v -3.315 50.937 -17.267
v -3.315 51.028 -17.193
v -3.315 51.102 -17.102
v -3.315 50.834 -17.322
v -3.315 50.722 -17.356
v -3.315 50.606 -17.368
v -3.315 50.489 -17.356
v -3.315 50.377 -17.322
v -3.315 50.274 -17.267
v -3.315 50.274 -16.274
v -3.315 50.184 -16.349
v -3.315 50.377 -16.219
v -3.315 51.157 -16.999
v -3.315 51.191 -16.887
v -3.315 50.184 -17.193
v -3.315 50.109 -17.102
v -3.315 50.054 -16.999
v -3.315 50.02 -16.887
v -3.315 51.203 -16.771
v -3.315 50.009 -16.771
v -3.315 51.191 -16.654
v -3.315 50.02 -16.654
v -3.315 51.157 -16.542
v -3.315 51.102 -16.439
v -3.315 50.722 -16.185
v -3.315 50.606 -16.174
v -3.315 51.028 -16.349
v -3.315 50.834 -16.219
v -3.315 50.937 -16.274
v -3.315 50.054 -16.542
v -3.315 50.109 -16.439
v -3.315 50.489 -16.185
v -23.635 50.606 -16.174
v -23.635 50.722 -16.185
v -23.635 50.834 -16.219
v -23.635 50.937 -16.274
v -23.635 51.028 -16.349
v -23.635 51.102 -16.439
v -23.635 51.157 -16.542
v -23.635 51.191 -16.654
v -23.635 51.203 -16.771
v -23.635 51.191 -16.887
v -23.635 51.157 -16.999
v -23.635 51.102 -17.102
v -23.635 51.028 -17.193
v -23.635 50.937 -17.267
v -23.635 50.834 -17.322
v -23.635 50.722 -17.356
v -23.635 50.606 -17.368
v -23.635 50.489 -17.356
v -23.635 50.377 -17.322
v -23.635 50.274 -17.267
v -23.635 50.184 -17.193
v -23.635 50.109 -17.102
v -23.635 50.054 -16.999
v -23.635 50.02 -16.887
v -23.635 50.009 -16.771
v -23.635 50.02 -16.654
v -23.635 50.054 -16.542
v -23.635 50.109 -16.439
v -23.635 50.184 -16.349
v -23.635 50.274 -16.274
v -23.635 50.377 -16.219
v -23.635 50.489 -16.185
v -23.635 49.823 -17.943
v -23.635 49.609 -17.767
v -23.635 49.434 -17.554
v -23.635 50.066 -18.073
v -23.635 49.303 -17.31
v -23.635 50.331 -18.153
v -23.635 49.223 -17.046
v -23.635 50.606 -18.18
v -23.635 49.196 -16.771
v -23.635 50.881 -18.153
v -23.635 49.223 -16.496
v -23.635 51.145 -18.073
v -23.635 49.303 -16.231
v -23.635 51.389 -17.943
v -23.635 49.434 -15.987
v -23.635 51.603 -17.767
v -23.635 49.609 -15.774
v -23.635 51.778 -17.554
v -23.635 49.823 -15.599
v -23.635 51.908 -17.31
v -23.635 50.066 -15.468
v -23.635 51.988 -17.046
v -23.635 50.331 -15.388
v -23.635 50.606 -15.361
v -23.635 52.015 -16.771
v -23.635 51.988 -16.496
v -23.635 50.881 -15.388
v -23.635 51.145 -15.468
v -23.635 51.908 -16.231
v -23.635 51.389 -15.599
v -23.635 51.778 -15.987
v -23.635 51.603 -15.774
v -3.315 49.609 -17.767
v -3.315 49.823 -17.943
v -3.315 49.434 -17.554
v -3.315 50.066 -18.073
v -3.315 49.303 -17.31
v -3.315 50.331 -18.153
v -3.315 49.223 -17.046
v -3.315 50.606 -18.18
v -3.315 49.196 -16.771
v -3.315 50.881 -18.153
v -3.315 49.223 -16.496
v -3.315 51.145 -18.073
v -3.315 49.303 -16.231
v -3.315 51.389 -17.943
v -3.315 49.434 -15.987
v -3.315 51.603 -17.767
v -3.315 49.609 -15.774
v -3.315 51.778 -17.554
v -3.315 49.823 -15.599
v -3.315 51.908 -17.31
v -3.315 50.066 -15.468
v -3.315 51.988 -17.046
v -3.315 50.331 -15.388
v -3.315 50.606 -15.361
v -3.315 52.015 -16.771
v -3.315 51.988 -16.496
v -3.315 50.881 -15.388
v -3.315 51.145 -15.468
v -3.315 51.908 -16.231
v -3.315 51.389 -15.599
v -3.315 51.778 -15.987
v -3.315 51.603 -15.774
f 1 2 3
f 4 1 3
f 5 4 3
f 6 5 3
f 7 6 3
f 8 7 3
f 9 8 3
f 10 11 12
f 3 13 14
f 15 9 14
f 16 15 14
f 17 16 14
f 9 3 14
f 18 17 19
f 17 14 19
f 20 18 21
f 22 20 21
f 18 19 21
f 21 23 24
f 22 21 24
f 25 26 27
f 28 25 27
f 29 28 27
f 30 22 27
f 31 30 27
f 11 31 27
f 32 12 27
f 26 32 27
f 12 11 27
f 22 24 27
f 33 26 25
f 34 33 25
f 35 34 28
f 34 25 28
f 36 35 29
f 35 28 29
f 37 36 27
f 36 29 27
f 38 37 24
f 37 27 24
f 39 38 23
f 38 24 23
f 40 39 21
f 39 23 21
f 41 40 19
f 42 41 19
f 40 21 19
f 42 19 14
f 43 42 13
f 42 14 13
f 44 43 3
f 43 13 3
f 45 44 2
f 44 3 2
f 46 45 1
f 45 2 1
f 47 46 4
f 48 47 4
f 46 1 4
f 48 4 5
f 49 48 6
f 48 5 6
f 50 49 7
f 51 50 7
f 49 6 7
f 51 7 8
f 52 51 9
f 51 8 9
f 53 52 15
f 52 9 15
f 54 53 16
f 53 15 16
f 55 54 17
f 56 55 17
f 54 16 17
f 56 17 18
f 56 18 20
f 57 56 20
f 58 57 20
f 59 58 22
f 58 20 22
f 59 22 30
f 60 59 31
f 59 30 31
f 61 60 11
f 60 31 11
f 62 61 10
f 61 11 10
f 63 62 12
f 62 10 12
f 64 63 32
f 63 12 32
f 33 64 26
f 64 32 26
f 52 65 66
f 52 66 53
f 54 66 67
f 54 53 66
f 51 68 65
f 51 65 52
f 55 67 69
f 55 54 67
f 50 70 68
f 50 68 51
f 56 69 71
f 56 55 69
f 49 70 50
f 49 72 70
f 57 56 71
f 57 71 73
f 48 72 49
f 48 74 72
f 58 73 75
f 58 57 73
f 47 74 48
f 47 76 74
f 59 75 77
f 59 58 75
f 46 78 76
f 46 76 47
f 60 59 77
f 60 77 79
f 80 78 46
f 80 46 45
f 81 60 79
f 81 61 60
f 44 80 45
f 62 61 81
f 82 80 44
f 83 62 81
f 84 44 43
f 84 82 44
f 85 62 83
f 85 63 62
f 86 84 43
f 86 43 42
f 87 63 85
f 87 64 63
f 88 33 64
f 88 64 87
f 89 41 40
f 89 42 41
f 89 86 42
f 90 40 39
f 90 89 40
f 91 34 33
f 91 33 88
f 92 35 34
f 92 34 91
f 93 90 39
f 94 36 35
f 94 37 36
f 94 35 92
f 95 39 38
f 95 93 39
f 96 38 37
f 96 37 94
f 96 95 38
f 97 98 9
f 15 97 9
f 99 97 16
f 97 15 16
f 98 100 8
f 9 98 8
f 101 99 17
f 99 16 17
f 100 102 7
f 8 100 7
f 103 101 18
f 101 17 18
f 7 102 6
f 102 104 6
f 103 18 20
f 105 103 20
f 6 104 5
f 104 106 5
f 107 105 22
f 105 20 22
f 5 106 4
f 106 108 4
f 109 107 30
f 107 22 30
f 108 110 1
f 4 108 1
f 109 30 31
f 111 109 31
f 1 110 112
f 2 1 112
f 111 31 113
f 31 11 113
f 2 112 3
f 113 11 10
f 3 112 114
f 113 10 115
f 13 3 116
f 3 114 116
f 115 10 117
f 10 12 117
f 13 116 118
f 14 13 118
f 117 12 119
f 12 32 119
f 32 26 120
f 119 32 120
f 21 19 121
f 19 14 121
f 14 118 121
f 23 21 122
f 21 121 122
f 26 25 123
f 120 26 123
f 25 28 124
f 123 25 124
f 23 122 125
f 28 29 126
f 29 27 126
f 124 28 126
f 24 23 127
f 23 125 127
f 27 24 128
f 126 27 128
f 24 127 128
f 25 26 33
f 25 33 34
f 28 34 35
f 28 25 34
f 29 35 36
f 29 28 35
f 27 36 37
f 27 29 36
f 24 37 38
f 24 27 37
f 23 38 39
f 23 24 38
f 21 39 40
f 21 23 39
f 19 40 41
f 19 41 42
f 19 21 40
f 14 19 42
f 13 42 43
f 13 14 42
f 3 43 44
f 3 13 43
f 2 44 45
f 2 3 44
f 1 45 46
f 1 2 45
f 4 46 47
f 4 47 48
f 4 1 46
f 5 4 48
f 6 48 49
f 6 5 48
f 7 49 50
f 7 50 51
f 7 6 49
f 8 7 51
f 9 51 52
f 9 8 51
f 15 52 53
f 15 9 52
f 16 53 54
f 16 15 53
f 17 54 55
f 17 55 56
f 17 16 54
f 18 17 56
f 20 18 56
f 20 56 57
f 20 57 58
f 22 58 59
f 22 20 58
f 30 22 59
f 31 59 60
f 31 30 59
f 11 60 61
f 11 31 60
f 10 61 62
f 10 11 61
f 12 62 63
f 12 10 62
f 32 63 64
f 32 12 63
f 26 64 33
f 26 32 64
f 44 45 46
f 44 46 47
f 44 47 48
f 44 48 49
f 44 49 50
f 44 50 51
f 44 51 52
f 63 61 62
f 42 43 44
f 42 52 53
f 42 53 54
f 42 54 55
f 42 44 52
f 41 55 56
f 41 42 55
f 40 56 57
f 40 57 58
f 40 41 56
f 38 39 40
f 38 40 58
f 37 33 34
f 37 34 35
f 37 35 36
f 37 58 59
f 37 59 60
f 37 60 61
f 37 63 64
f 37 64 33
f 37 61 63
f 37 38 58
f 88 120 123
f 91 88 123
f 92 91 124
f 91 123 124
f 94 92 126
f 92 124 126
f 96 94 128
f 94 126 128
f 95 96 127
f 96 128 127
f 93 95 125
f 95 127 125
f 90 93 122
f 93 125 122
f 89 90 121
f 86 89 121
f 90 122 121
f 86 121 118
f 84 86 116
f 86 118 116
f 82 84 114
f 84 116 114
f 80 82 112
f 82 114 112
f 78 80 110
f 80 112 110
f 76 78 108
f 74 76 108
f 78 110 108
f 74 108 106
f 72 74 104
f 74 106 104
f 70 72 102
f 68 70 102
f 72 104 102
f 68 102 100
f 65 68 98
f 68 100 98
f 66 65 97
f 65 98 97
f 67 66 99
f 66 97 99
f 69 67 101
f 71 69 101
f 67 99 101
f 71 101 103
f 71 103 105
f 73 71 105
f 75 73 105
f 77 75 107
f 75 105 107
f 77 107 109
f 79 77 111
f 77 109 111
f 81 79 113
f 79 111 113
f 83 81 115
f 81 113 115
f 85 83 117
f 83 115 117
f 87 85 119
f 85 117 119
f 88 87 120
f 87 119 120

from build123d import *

# Parameters (mm, degrees)
SKETCH1_R           = 0.5969
BOSS_EXTRUDE1_DEPTH = 20.32
SKETCH1_3_R         = 1.4097
SKETCH1_3_R_2       = 0.5969
BOSS_EXTRUDE2_DEPTH = 20.32


with BuildPart() as part:
    # Sketch1 → Boss-Extrude1 (new body)
    with BuildSketch(Plane.ZY.offset(3.314620275)):
        with Locations((-16.770638736, 50.605756537)):
            Circle(SKETCH1_R)
    extrude(amount=BOSS_EXTRUDE1_DEPTH)


with BuildPart() as body_2:
    # Sketch1<3> → Boss-Extrude2 (new body)
    with BuildSketch(Plane.ZY.offset(3.314620275)):
        with Locations((-16.770638736, 50.605756537)):
            Circle(SKETCH1_3_R)
        with Locations((-16.770638736, 50.605756537)):
            Circle(SKETCH1_3_R_2, mode=Mode.SUBTRACT)
    extrude(amount=BOSS_EXTRUDE2_DEPTH)


solid = Compound([part.part, body_2.part])
